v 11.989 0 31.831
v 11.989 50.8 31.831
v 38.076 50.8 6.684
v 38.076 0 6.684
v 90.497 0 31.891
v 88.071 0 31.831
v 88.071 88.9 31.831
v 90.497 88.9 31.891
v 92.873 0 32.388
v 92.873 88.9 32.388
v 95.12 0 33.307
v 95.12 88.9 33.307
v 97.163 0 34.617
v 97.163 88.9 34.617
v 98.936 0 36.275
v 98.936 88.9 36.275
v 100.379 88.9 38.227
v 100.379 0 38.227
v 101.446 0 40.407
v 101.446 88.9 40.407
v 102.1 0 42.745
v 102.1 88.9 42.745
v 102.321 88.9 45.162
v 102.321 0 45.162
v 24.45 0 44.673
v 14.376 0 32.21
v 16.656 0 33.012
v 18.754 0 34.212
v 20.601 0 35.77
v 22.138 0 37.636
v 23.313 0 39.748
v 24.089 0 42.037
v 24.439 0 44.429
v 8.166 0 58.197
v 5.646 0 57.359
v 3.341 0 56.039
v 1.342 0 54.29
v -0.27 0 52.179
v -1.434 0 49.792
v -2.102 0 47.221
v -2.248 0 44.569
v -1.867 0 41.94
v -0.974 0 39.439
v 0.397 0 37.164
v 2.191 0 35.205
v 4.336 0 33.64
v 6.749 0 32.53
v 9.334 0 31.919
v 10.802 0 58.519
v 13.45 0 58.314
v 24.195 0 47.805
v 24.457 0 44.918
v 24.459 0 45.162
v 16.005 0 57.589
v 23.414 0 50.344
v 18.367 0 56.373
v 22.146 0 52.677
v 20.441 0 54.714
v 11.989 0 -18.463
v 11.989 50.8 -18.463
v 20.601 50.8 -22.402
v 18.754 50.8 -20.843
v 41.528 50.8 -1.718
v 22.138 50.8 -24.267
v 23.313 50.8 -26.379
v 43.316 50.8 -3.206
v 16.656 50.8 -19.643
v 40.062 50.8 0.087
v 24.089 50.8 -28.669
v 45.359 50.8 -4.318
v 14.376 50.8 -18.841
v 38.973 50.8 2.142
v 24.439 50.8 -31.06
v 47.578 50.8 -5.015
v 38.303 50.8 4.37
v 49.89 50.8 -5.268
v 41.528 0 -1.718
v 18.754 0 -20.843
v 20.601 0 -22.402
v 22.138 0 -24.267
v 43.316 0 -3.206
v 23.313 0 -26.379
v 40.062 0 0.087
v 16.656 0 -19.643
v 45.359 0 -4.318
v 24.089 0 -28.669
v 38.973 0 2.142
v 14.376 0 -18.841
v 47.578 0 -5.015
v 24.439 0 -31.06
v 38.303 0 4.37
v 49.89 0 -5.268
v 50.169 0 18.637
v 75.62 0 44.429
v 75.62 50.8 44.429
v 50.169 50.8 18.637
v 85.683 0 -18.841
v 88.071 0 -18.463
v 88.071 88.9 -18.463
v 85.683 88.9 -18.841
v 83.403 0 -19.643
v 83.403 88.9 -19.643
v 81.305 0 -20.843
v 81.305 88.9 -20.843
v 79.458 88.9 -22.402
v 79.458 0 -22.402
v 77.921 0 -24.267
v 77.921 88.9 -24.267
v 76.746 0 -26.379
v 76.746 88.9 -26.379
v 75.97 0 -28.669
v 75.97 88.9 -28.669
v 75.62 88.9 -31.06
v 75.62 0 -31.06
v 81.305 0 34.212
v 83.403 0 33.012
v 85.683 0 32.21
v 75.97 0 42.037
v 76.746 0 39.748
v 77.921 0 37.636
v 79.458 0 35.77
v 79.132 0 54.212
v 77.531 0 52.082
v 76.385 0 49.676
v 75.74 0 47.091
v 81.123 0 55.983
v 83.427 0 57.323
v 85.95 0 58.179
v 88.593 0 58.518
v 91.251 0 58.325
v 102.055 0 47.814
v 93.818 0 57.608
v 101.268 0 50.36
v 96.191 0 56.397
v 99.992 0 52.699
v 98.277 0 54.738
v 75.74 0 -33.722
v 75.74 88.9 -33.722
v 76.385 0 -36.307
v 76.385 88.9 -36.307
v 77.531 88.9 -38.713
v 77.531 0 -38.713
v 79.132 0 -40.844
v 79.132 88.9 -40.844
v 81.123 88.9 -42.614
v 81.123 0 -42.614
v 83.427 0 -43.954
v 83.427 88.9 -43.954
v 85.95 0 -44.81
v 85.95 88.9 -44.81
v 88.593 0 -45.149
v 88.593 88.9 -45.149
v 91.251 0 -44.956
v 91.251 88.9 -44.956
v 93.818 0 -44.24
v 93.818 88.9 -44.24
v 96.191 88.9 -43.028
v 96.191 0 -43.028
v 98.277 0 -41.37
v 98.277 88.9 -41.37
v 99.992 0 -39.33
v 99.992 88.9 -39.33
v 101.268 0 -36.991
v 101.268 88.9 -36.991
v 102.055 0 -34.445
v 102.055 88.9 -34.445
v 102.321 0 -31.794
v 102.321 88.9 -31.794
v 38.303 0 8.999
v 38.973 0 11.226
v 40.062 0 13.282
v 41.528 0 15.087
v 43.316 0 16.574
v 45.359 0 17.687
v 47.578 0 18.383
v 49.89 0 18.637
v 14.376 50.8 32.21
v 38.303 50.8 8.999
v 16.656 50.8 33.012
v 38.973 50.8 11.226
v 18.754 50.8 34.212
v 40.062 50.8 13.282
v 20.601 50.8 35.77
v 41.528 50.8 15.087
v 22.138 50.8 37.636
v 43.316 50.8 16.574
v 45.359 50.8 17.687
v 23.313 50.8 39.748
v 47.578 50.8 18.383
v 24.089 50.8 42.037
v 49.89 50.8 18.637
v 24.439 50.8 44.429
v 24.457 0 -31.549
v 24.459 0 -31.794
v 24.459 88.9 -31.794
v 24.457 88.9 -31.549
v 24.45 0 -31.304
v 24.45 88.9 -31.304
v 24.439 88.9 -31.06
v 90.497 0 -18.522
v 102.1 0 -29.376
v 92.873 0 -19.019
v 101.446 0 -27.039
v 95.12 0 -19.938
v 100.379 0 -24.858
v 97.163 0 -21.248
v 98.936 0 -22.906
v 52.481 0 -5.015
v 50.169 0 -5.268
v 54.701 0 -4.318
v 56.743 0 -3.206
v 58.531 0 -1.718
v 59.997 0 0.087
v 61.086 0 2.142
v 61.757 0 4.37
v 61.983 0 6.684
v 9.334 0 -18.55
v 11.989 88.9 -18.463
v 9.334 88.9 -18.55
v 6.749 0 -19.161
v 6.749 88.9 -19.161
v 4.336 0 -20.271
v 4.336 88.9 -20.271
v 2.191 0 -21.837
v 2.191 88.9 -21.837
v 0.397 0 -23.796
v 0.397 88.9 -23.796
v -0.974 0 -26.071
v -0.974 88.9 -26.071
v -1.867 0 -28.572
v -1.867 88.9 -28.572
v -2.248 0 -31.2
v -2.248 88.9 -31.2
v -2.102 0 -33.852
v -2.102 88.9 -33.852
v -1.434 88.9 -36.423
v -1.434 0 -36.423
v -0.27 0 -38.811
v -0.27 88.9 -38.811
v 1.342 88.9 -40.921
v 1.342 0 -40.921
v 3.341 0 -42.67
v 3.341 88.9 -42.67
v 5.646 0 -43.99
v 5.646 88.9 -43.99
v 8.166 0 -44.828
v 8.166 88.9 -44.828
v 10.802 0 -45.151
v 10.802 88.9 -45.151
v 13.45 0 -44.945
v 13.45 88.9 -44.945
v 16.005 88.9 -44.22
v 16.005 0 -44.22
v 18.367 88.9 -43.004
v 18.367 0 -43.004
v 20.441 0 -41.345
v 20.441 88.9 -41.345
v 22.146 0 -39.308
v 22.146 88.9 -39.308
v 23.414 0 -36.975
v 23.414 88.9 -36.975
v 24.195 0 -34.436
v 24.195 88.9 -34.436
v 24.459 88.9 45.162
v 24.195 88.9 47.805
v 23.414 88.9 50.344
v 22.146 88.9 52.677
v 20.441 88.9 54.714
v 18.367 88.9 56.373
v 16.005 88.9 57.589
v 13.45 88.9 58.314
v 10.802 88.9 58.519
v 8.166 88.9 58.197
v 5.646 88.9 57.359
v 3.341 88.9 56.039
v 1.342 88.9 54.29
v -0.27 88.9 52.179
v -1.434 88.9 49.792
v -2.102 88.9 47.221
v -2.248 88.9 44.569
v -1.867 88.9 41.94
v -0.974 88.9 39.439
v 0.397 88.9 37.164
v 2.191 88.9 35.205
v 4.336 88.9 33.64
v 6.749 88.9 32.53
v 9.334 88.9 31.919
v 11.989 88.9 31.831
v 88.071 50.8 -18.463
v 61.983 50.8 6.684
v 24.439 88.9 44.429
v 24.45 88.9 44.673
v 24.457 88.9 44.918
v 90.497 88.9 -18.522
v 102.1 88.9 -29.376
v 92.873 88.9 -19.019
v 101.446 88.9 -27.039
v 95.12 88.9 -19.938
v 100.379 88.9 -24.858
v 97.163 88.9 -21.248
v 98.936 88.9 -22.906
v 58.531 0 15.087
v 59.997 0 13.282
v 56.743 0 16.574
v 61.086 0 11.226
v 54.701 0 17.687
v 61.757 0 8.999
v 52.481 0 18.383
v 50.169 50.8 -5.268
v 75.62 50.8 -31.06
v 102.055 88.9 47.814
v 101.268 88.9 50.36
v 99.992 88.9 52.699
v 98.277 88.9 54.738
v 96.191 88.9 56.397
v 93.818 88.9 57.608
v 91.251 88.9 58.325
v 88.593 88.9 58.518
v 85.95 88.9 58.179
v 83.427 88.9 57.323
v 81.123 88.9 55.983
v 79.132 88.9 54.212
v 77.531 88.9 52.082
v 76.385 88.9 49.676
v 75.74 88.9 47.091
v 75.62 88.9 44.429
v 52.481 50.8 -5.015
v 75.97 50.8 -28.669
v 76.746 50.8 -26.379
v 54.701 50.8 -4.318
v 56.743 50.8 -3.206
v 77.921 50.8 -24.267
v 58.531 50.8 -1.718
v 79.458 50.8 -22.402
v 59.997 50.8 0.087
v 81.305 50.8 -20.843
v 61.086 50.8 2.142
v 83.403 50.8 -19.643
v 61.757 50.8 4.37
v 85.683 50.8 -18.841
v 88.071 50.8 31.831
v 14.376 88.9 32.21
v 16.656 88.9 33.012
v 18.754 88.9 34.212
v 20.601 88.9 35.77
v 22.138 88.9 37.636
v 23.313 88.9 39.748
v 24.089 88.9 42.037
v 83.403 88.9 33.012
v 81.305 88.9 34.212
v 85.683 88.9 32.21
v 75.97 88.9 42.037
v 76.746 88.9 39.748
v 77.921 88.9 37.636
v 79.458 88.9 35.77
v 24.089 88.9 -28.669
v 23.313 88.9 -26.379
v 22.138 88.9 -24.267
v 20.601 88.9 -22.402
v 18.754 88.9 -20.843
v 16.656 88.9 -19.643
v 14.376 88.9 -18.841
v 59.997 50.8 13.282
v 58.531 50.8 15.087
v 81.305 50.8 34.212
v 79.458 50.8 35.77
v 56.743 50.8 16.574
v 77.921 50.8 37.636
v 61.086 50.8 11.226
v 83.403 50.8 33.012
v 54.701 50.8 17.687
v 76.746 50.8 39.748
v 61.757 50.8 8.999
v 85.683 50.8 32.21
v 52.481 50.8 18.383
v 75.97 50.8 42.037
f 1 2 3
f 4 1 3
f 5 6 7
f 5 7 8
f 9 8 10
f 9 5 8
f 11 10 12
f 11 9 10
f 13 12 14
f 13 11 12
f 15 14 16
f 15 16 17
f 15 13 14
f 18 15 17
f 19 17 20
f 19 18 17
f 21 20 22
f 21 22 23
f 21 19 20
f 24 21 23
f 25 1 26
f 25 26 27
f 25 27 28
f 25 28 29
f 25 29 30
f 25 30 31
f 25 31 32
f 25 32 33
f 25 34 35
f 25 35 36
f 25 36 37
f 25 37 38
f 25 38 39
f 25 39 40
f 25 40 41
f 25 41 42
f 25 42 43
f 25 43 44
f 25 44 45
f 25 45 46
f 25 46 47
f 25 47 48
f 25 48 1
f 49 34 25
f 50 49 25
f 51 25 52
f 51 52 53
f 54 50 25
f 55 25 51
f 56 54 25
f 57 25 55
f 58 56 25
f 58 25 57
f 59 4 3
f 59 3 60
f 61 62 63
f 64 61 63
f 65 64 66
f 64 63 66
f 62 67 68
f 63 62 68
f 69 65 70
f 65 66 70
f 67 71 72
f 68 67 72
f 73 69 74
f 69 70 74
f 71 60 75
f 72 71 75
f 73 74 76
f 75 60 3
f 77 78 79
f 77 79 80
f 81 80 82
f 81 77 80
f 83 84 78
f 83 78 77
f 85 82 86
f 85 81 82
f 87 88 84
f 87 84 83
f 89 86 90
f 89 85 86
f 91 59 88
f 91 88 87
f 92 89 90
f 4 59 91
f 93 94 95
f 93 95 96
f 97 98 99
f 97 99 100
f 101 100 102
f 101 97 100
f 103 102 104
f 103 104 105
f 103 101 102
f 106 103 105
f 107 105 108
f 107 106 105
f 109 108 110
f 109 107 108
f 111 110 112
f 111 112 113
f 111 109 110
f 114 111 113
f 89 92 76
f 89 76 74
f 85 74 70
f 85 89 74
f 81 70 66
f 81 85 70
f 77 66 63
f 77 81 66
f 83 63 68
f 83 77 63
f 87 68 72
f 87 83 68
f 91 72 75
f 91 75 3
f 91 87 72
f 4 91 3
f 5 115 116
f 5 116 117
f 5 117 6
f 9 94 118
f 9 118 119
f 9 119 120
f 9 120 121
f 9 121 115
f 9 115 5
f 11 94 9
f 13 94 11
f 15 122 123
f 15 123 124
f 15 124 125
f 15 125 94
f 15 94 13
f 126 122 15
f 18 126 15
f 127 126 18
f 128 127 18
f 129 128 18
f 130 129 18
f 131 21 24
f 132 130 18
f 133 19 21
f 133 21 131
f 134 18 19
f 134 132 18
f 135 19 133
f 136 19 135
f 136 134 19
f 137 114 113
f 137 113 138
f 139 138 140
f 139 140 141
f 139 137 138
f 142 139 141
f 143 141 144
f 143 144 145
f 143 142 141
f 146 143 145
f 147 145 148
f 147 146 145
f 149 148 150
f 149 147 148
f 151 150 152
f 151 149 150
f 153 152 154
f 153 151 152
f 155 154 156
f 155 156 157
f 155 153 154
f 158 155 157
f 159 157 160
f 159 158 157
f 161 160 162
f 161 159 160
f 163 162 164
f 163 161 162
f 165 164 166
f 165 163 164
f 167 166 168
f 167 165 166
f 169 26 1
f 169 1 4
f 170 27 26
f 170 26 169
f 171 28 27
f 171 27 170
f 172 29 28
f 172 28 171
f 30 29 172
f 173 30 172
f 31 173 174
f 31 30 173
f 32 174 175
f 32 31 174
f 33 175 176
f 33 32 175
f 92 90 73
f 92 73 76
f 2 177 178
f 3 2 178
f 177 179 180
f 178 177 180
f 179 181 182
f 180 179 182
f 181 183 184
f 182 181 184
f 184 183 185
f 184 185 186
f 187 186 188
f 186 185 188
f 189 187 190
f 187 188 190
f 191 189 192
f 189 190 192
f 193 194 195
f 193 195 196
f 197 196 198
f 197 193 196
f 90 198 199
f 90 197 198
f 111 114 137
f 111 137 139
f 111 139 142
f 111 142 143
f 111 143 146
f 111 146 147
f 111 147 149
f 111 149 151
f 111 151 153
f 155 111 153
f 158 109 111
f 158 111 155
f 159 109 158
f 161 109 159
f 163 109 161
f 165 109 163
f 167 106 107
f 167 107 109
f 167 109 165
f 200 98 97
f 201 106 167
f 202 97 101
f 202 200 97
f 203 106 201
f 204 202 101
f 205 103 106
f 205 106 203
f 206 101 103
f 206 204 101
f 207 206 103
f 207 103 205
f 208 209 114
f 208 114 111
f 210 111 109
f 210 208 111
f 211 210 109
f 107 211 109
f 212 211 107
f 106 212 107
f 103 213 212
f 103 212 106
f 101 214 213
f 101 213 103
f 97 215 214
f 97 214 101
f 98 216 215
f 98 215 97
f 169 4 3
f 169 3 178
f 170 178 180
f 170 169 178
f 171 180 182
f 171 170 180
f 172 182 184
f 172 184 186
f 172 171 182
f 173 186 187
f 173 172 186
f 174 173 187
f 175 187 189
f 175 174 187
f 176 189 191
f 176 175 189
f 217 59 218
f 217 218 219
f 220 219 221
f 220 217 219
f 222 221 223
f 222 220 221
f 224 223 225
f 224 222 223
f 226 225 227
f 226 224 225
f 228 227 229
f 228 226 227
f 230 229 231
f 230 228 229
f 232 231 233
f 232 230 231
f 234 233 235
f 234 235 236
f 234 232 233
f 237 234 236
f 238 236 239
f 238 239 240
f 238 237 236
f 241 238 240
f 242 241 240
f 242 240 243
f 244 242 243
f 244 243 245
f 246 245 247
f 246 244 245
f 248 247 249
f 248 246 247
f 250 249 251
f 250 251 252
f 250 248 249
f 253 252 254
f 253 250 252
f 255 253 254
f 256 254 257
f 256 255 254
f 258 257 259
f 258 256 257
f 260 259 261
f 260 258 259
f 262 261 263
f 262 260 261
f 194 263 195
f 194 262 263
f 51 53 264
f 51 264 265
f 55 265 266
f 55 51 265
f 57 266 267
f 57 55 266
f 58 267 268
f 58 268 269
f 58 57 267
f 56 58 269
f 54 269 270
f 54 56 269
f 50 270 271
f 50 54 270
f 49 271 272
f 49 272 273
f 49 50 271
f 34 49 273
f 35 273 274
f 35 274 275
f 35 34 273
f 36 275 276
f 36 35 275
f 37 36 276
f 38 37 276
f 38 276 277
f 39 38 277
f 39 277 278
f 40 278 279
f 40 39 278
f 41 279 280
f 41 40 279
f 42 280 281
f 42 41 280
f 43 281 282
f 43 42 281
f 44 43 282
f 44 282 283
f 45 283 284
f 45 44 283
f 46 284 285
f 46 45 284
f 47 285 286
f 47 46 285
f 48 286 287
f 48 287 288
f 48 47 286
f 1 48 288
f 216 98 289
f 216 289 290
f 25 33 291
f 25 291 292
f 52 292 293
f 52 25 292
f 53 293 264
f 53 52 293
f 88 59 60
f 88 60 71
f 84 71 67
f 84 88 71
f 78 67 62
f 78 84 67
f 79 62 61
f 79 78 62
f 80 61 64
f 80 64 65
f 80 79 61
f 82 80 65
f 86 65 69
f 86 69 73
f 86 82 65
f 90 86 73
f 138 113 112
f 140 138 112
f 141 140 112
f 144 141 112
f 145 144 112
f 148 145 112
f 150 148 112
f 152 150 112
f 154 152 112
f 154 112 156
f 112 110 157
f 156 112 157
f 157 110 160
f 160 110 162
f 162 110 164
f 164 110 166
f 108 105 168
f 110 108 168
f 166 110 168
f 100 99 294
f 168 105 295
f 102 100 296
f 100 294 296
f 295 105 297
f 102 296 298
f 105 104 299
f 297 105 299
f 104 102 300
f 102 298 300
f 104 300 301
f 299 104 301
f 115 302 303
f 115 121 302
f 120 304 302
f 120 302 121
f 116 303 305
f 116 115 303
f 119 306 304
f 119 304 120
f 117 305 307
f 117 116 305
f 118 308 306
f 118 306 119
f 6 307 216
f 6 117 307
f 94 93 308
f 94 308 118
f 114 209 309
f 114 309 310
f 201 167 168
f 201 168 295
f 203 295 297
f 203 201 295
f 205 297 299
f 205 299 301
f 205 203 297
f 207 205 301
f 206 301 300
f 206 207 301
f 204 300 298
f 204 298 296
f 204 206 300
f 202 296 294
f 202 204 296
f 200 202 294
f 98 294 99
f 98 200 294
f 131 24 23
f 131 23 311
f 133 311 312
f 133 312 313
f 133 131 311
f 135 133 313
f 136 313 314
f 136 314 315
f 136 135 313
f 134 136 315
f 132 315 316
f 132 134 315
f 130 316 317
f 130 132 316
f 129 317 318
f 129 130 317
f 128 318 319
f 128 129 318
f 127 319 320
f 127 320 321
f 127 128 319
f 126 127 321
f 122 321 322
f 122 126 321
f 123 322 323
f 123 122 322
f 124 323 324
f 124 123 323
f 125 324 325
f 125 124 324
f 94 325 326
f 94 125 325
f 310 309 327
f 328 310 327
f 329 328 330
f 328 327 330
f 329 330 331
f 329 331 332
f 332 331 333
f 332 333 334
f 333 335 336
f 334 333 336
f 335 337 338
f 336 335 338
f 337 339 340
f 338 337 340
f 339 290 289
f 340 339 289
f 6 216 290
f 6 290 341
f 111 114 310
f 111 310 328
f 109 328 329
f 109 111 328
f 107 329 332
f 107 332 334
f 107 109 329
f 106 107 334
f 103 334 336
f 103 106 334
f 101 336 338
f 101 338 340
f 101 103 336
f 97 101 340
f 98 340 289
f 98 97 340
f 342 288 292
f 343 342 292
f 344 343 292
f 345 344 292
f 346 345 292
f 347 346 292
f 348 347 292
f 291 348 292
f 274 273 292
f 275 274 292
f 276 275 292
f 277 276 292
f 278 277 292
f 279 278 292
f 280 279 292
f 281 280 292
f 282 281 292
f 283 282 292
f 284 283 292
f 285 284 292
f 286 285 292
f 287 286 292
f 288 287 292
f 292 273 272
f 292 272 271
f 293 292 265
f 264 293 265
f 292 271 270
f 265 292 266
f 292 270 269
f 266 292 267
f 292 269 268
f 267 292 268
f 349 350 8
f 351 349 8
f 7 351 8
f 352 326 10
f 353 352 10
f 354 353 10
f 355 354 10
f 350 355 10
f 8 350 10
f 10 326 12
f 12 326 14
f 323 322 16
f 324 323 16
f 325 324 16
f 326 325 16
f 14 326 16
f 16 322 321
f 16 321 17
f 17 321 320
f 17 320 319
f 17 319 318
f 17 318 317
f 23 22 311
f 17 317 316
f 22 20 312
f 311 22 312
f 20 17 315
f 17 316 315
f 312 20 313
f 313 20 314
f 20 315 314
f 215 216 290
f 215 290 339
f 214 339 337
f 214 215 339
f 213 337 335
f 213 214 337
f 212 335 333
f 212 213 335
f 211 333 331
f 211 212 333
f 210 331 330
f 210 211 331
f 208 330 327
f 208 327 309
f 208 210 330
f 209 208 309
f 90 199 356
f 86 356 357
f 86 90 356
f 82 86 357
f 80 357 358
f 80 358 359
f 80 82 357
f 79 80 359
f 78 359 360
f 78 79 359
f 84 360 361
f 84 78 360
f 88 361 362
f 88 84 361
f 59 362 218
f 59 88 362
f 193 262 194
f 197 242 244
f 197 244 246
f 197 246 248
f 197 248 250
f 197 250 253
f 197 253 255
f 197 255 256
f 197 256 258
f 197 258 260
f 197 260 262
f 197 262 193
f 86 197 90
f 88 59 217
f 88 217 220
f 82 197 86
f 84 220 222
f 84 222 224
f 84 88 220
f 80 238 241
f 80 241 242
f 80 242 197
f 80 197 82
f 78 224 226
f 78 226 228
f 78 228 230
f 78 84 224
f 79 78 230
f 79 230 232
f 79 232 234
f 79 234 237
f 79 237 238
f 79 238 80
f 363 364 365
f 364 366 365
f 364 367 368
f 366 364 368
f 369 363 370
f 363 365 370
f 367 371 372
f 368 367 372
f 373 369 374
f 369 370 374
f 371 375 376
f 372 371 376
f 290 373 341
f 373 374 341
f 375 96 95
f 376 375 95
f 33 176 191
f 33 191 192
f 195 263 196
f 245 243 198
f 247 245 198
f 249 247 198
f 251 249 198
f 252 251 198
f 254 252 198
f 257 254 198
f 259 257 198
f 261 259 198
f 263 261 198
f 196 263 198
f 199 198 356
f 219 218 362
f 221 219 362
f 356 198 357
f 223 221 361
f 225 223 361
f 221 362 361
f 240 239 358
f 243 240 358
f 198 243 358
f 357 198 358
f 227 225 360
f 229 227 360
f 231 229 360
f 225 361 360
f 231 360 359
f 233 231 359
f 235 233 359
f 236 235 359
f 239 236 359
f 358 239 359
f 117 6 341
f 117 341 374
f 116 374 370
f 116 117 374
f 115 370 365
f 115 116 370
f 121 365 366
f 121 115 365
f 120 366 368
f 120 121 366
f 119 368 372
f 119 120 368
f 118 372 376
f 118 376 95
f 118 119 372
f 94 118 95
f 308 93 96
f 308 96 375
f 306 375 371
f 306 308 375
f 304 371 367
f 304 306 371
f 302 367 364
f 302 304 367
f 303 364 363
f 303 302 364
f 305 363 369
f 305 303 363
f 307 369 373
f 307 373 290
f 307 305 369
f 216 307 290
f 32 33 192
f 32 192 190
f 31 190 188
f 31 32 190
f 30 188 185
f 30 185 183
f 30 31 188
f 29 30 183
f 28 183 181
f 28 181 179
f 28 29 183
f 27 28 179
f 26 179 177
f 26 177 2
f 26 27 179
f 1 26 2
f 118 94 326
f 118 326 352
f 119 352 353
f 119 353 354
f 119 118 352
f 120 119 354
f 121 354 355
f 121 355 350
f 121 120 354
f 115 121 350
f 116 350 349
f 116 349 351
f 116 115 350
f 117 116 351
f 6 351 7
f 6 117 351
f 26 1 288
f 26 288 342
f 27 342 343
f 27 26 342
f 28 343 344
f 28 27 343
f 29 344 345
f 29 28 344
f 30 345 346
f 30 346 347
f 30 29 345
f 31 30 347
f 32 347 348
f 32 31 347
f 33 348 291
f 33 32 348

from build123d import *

# Parameters (mm, degrees)
F1_DEPTH = 88.9
F2_DEPTH = 50.8


with BuildPart() as f1:
    # F0 (on Front) → F1 (new body)
    with BuildSketch(Plane.XZ):
        with BuildLine():
            ThreePointArc((75.619888, 44.428689), (79.457821, 35.77043), (88.070601, 31.831498))
            ThreePointArc((88.070601, 31.831498), (98.087449, 35.405593), (102.320534, 45.162252))
            ThreePointArc((102.320534, 45.162252), (88.593214, 58.517613), (75.619888, 44.428689))
        make_face()
        with BuildLine():
            ThreePointArc((11.988504, 31.831498), (20.601284, 35.77043), (24.439217, 44.428689))
            ThreePointArc((24.439217, 44.428689), (24.454331, 44.795332), (24.459371, 45.162252))
            ThreePointArc((24.459371, 45.162252), (1.342311, 54.289568), (11.988504, 31.831498))
        make_face()
        with BuildLine():
            ThreePointArc((24.459371, -31.793552), (24.454331, -31.426632), (24.439217, -31.059989))
            ThreePointArc((24.439217, -31.059989), (20.601284, -22.40173), (11.988504, -18.462797))
            ThreePointArc((11.988504, -18.462797), (1.342311, -40.920867), (24.459371, -31.793552))
        make_face()
        with BuildLine():
            ThreePointArc((102.320534, -31.793552), (98.087449, -22.036892), (88.070601, -18.462797))
            ThreePointArc((88.070601, -18.462797), (79.457821, -22.40173), (75.619888, -31.059989))
            ThreePointArc((75.619888, -31.059989), (88.593214, -45.148913), (102.320534, -31.793552))
        make_face()
    extrude(amount=-F1_DEPTH)


with BuildPart() as f2:
    # F0 (on Front) → F2 (new body)
    with BuildSketch(Plane.XZ):
        with BuildLine():
            ThreePointArc((50.169352, 18.636803), (58.531074, 15.087017), (61.982823, 6.68435))
            Line((61.982823, 6.68435), (88.070601, 31.831498))
            ThreePointArc((88.070601, 31.831498), (79.457821, 35.77043), (75.619888, 44.428689))
            Line((75.619888, 44.428689), (50.169352, 18.636803))
        make_face()
        with BuildLine():
            Line((88.070601, -18.462797), (61.982823, 6.68435))
            ThreePointArc((61.982823, 6.68435), (58.531074, -1.718317), (50.169352, -5.268103))
            Line((50.169352, -5.268103), (75.619888, -31.059989))
            ThreePointArc((75.619888, -31.059989), (79.457821, -22.40173), (88.070601, -18.462797))
        make_face()
        with BuildLine():
            Line((24.439217, -31.059989), (49.889753, -5.268103))
            ThreePointArc((49.889753, -5.268103), (41.528031, -1.718317), (38.076282, 6.68435))
            Line((38.076282, 6.68435), (11.988504, -18.462797))
            ThreePointArc((11.988504, -18.462797), (20.601284, -22.40173), (24.439217, -31.059989))
        make_face()
        with BuildLine():
            ThreePointArc((38.076282, 6.68435), (41.528031, 15.087017), (49.889753, 18.636803))
            Line((49.889753, 18.636803), (24.439217, 44.428689))
            ThreePointArc((24.439217, 44.428689), (20.601284, 35.77043), (11.988504, 31.831498))
            Line((11.988504, 31.831498), (38.076282, 6.68435))
        make_face()
    extrude(amount=-F2_DEPTH)


solid = Compound([f1.part, f2.part])
